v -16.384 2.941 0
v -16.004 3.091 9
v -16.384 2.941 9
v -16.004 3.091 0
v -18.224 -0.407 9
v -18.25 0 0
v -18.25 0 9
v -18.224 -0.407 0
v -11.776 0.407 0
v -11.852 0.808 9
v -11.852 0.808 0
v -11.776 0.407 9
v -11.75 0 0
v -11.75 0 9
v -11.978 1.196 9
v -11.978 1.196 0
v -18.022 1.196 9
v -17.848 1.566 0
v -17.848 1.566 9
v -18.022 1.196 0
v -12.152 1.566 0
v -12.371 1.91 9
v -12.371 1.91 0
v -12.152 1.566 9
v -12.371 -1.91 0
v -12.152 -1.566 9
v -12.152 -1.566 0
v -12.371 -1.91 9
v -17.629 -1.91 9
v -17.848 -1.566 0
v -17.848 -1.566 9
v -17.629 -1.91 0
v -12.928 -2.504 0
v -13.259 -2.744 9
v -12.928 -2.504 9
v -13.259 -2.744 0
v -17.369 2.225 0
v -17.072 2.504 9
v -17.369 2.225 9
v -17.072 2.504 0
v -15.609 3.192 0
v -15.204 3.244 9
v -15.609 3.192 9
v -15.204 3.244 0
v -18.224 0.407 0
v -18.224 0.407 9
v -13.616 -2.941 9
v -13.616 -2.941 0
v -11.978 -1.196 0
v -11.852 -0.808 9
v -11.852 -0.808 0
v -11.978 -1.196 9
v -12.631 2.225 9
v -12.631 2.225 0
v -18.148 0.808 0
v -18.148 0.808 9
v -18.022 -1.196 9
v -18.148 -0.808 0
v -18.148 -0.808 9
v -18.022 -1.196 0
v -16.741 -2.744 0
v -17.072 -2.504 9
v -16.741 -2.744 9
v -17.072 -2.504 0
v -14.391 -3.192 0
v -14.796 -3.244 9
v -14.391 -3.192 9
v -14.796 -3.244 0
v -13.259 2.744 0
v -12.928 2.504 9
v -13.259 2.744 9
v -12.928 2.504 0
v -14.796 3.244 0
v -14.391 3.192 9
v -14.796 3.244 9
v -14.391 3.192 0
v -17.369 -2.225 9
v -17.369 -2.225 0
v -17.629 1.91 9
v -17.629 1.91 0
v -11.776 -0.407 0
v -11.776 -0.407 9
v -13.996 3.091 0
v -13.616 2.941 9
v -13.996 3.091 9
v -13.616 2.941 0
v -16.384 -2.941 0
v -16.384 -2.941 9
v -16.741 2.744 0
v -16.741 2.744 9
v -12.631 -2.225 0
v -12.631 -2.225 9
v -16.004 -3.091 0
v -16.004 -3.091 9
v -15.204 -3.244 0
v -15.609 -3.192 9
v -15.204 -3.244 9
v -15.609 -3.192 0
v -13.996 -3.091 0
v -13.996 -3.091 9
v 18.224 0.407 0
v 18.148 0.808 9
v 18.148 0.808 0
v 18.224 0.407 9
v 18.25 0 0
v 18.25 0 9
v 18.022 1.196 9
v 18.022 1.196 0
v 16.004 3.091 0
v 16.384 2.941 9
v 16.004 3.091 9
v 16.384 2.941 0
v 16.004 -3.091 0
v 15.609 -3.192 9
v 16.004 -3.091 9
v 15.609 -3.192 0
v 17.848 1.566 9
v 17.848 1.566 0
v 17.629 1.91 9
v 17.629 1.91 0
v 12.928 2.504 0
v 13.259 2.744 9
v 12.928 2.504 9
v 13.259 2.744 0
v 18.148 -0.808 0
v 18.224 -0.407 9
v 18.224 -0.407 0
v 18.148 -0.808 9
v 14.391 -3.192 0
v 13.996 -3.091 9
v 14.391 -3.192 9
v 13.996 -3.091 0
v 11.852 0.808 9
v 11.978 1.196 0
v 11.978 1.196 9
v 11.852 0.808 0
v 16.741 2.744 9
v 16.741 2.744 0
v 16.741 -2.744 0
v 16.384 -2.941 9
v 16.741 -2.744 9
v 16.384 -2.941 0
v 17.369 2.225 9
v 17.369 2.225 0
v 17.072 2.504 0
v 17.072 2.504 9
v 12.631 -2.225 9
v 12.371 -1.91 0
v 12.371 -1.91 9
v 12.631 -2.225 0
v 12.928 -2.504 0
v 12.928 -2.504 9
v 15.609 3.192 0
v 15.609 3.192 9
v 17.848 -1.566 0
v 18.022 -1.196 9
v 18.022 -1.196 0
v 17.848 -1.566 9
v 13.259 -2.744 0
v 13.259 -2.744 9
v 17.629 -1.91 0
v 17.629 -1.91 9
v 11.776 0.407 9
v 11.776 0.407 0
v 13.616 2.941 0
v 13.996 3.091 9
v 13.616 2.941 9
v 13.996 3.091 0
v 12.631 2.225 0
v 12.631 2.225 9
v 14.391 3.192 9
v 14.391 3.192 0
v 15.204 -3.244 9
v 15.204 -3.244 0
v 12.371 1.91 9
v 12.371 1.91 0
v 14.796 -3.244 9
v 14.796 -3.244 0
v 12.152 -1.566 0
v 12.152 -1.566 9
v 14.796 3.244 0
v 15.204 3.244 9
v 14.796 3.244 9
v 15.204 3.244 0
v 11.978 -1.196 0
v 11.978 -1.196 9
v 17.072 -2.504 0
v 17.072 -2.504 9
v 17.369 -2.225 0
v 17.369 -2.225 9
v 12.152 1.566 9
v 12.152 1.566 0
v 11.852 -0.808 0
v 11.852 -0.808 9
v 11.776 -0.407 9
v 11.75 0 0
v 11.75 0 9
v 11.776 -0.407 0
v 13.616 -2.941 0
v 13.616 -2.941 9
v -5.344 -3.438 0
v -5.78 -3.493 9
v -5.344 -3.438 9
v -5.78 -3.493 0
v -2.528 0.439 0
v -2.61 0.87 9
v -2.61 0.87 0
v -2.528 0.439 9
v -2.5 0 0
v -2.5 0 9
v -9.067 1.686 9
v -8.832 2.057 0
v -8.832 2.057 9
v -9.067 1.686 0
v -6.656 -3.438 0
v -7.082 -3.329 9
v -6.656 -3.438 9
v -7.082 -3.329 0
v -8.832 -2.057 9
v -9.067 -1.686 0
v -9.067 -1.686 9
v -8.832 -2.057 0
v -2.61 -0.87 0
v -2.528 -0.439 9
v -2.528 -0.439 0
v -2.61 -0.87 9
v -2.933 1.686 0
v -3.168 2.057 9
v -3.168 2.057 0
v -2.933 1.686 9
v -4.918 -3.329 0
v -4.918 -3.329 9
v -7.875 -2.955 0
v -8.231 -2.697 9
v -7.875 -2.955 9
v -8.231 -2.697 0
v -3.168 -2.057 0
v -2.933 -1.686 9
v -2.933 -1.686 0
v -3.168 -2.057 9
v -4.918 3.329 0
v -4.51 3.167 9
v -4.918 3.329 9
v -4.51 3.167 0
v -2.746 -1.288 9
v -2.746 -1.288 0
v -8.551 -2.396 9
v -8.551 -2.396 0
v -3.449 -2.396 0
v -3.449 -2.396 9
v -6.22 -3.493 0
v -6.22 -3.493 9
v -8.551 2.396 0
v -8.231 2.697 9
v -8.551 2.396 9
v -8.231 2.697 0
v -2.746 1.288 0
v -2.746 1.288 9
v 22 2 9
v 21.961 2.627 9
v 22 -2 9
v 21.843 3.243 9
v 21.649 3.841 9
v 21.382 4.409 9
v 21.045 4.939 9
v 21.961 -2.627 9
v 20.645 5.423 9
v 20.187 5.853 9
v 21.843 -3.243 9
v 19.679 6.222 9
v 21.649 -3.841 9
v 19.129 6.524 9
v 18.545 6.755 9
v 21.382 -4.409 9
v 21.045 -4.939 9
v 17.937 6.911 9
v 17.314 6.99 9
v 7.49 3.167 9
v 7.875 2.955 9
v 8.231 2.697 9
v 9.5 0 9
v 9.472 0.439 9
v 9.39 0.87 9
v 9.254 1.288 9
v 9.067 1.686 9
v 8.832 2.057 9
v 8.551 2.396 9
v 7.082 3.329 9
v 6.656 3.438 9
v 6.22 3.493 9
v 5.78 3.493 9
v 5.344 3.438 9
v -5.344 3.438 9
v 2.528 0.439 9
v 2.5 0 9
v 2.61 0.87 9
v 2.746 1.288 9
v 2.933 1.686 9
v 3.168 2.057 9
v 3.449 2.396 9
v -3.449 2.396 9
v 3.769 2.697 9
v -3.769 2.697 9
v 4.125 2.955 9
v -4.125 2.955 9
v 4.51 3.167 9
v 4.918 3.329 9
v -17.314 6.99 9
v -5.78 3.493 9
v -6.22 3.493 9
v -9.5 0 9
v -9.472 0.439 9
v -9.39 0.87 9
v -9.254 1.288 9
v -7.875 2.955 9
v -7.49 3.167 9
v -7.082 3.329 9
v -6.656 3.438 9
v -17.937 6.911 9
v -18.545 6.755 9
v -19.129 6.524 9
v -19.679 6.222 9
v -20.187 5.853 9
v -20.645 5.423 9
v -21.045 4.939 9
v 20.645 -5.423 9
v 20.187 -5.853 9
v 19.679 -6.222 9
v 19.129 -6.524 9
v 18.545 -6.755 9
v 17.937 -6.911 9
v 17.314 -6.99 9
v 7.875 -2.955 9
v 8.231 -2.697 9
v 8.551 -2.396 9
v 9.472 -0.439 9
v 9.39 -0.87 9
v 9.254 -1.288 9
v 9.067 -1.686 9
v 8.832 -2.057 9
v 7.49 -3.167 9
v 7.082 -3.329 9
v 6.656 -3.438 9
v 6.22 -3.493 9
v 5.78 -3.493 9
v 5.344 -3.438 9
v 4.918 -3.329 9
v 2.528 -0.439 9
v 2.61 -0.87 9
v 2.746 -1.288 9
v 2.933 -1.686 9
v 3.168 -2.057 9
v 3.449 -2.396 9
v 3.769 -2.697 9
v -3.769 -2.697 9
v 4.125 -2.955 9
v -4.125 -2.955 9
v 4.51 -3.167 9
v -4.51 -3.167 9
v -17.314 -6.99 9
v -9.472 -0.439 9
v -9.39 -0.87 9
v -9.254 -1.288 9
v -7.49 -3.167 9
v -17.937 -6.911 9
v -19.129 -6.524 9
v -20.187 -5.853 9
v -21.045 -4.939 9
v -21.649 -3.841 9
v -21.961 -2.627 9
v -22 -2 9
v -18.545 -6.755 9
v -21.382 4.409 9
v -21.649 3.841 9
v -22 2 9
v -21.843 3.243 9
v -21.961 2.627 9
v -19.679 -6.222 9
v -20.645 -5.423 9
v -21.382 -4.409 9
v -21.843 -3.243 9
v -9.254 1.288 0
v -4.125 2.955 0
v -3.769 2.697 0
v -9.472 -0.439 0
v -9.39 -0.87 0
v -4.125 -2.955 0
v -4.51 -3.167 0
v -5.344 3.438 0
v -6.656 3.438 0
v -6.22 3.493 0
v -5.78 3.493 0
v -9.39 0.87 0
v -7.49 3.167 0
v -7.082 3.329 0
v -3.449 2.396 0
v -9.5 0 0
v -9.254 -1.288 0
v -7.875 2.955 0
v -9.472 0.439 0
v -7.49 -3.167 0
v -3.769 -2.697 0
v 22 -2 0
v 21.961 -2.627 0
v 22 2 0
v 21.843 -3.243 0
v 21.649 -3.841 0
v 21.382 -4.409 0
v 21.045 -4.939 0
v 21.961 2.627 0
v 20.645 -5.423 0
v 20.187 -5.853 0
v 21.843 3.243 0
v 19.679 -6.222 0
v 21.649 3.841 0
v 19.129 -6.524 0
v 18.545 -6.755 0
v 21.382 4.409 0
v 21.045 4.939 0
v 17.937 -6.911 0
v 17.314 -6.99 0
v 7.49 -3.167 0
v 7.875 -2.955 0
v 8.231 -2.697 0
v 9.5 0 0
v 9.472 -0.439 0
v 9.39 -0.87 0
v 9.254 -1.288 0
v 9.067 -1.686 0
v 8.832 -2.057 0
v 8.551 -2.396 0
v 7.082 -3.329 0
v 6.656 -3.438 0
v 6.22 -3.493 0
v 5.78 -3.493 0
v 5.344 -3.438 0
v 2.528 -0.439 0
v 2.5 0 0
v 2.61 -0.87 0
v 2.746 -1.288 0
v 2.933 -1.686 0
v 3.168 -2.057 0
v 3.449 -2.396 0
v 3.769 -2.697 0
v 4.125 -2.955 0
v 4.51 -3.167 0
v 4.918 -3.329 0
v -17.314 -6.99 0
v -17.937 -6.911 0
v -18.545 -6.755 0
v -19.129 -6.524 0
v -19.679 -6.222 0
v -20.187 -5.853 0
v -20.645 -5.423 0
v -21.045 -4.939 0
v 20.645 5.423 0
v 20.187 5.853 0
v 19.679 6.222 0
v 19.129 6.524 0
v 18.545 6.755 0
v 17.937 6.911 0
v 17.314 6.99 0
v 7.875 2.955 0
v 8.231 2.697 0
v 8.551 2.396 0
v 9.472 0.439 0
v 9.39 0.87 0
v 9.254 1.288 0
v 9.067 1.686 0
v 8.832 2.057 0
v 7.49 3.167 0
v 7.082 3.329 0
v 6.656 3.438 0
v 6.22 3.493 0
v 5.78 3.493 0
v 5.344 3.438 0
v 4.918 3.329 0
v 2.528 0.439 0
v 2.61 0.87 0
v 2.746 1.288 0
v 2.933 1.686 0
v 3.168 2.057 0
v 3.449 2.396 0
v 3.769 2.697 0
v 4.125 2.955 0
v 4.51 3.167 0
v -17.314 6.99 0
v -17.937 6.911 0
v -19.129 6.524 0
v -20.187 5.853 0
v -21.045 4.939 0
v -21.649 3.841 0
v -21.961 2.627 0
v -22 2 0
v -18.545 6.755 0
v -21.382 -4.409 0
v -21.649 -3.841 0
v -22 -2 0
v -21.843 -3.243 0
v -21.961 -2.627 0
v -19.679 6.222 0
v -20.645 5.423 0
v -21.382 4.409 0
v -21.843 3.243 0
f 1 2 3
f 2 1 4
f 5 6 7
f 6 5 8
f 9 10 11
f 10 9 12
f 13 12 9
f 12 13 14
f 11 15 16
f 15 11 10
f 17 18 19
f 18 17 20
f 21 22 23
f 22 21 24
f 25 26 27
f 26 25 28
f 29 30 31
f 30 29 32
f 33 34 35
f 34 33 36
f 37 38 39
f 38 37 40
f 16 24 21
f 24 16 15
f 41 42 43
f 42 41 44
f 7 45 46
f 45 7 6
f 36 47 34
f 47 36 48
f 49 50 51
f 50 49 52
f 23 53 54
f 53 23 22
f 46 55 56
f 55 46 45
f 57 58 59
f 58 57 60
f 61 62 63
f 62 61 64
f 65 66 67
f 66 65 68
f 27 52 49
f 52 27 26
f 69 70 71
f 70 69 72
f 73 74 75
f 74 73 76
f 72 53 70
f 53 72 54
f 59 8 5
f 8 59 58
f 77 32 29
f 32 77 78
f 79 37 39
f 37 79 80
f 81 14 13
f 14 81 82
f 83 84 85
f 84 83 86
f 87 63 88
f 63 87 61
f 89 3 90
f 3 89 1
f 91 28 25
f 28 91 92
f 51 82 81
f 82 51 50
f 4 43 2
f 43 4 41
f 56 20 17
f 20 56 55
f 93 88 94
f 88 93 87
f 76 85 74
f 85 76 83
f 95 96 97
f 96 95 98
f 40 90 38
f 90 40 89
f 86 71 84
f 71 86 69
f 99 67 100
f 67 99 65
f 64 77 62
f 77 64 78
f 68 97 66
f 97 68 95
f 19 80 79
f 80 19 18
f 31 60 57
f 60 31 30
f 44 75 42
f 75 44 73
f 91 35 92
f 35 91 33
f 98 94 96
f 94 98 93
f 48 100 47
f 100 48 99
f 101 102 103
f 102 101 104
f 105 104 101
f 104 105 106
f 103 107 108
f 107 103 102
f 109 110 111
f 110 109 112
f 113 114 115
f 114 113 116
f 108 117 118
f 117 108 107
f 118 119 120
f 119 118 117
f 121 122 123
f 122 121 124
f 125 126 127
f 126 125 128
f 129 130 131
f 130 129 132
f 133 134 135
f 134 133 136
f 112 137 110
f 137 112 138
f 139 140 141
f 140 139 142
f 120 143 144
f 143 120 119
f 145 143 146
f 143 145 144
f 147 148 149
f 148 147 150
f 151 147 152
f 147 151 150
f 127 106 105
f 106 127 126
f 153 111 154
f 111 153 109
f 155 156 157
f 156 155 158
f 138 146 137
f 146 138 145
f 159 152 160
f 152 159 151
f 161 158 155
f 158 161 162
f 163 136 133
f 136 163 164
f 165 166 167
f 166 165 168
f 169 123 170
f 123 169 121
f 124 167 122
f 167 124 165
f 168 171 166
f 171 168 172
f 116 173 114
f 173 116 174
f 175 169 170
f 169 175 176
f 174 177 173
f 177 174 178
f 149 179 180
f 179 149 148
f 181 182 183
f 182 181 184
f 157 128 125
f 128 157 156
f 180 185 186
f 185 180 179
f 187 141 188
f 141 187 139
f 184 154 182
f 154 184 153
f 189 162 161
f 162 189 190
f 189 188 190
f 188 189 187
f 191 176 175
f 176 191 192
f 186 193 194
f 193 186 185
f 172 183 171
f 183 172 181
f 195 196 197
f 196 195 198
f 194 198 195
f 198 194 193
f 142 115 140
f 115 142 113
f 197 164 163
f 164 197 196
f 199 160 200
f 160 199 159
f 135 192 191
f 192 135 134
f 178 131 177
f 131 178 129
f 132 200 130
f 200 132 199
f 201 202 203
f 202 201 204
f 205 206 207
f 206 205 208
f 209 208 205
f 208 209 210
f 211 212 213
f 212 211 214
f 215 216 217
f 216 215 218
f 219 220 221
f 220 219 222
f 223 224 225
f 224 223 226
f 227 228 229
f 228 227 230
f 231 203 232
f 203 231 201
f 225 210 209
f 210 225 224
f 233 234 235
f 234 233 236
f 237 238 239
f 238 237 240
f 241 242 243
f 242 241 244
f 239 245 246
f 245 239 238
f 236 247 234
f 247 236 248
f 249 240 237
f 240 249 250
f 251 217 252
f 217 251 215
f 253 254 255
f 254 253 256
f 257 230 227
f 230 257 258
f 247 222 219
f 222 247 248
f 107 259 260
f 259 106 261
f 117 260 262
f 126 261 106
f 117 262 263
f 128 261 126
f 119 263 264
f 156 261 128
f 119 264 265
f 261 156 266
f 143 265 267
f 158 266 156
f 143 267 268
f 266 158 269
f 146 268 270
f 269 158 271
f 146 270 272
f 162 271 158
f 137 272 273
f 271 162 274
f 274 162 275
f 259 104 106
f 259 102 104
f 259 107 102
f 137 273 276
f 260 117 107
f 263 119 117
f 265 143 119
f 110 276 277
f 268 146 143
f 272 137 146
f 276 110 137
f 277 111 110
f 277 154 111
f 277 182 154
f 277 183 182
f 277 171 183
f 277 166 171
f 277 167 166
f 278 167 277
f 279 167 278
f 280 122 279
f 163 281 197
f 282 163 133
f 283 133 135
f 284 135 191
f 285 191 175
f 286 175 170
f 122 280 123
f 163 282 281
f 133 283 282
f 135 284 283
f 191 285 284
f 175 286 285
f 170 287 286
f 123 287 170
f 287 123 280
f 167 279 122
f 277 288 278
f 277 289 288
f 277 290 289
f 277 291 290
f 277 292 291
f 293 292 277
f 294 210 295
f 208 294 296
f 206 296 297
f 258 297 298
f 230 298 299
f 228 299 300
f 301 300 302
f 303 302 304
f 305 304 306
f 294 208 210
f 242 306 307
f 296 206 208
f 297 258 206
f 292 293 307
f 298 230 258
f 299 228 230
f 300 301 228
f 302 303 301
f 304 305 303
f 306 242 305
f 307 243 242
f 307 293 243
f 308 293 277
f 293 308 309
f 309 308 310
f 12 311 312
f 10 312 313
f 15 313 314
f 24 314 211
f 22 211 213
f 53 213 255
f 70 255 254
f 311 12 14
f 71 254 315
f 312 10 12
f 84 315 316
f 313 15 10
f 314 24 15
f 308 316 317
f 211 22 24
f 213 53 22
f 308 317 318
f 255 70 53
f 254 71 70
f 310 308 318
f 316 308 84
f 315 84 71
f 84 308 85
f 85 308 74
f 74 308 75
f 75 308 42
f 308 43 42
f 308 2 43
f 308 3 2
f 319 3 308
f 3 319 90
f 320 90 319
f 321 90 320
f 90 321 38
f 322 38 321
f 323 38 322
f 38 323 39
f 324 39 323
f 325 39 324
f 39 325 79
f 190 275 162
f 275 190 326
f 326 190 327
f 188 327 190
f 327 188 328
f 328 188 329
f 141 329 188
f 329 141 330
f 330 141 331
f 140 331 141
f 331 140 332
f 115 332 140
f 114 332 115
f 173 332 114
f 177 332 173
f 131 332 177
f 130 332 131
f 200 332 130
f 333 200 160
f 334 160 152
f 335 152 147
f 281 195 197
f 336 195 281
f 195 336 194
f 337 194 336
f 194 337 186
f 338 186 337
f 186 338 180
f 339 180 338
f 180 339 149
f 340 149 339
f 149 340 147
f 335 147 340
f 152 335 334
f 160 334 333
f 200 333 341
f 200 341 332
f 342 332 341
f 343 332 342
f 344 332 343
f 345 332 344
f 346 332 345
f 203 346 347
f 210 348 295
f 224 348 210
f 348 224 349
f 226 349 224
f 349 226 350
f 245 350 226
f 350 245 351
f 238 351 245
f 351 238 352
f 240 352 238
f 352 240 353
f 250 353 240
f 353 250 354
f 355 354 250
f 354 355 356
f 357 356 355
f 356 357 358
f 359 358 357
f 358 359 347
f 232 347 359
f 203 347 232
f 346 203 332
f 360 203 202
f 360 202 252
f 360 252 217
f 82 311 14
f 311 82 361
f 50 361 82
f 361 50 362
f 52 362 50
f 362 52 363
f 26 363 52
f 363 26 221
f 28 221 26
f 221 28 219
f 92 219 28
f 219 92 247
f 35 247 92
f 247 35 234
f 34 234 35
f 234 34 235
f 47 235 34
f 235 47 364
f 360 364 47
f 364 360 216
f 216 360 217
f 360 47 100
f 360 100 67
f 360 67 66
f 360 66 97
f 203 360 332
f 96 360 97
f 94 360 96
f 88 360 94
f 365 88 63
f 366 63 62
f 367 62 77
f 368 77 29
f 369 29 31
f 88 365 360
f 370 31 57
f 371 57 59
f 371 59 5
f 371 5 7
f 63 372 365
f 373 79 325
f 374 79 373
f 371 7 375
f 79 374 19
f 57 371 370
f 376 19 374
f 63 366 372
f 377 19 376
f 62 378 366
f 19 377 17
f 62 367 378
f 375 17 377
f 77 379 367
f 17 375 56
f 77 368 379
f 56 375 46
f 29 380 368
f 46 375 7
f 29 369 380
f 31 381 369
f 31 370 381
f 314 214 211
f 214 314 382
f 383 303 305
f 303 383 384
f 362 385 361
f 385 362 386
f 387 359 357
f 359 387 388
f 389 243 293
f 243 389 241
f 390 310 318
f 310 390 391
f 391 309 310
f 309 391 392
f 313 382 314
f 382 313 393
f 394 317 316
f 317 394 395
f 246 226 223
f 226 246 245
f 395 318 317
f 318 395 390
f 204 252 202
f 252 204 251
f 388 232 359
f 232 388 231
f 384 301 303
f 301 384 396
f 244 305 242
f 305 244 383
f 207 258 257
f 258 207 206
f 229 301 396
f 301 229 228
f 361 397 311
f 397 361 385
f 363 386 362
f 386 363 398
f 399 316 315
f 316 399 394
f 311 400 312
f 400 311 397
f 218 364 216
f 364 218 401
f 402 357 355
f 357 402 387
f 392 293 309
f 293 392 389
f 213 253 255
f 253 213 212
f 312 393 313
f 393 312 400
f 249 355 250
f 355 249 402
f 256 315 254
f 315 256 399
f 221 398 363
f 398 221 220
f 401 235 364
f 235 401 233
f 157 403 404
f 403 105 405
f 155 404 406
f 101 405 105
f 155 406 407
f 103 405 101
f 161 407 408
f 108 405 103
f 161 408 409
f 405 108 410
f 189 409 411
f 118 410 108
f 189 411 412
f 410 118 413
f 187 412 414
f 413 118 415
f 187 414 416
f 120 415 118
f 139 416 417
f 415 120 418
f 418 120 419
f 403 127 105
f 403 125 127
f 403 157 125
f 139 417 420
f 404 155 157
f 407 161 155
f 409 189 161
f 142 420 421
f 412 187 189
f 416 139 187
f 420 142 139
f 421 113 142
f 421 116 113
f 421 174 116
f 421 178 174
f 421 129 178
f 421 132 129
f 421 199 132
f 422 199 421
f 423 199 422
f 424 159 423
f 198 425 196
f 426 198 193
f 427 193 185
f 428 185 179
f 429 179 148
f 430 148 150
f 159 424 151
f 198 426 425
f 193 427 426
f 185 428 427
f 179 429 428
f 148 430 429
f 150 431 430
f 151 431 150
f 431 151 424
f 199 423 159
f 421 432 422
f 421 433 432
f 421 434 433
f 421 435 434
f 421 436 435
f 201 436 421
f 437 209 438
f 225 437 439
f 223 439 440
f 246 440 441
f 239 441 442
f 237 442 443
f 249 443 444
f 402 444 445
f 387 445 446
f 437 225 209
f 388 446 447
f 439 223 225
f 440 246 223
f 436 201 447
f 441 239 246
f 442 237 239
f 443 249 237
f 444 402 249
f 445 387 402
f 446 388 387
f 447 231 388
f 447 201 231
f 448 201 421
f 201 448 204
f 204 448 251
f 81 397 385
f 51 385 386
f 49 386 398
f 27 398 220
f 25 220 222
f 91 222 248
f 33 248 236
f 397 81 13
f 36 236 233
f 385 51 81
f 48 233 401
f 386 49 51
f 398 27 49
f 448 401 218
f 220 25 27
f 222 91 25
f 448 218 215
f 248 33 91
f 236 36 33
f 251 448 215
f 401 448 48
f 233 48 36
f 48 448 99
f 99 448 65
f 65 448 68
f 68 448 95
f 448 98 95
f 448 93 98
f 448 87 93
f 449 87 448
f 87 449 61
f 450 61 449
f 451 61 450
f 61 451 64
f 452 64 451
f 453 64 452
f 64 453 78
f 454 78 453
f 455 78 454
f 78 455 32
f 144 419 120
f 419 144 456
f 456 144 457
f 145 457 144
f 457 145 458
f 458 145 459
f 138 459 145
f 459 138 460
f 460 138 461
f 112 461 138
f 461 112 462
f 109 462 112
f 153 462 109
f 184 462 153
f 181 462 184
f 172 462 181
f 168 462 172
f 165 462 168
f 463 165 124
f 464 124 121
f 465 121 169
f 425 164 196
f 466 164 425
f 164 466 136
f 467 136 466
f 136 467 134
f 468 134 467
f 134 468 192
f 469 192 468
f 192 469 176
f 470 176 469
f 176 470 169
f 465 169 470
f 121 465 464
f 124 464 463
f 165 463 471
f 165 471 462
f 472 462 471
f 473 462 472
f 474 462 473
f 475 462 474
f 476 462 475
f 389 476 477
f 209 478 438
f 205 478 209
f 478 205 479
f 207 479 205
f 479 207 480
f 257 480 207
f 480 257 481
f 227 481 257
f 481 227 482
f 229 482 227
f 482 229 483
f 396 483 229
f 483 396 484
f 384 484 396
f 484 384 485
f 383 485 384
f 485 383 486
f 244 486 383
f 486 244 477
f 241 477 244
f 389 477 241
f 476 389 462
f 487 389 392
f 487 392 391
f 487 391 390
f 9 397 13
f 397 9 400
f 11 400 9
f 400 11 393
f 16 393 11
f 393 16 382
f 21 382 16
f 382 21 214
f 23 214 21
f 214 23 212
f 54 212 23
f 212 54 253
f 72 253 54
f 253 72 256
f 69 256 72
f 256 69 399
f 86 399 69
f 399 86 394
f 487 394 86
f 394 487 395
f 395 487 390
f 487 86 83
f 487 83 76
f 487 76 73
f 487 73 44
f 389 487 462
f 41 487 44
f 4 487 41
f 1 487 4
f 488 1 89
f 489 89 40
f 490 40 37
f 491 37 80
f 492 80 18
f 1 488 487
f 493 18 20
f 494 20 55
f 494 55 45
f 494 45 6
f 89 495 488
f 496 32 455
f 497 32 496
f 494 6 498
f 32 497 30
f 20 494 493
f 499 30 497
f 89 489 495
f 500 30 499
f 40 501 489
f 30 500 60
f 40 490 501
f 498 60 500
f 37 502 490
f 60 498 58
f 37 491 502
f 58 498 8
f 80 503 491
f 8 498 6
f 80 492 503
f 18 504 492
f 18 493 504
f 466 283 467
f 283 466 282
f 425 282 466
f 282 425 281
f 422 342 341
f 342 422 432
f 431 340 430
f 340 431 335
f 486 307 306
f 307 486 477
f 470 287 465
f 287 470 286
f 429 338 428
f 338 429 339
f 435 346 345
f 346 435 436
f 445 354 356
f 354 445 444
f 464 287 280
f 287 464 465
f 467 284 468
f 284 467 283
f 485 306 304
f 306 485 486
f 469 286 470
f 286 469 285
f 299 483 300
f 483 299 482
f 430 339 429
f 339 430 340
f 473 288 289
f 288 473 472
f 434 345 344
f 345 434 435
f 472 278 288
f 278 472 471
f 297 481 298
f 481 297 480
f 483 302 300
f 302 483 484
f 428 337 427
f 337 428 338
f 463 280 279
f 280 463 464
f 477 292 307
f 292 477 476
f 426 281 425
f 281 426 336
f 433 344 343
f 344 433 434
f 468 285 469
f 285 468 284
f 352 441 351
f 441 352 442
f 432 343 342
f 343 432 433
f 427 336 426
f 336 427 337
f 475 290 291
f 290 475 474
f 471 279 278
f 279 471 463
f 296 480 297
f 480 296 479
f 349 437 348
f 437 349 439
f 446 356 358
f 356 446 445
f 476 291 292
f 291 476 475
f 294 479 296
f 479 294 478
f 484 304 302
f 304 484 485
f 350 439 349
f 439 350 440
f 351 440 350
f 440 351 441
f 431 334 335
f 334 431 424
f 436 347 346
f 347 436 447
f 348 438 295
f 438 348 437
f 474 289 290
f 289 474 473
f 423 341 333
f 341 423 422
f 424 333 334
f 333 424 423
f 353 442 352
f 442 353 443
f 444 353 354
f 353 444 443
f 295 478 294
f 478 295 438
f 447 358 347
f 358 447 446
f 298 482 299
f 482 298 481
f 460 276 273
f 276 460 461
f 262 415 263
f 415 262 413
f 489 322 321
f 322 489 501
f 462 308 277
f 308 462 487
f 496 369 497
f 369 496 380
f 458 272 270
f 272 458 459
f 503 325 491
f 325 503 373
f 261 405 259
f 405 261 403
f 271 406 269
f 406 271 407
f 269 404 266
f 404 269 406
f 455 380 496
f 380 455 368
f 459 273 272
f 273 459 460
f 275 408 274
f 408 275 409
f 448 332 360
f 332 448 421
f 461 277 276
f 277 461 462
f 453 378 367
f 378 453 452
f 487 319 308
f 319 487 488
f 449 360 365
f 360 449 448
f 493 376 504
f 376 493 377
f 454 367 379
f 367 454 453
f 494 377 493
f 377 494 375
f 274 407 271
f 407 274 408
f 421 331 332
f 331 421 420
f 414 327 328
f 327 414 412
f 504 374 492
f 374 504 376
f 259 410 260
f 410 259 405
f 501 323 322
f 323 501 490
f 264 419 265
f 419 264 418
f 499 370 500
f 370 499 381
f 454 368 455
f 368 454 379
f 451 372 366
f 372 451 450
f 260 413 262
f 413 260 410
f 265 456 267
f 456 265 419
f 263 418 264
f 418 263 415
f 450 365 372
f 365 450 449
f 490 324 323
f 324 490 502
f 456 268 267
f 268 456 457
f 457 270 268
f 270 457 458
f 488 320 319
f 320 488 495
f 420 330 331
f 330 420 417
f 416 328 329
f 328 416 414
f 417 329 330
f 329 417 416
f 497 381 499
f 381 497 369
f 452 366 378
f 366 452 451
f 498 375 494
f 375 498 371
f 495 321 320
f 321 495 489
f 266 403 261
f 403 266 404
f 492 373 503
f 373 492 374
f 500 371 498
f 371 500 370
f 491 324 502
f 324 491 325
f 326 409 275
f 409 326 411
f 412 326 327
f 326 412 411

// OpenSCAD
$fn = 50;


difference() {
	union() {
		hull() {
			translate(v = [-17.0000000000, 2.0000000000, 0]) {
				cylinder(h = 9, r = 5);
			}
			translate(v = [17.0000000000, 2.0000000000, 0]) {
				cylinder(h = 9, r = 5);
			}
			translate(v = [-17.0000000000, -2.0000000000, 0]) {
				cylinder(h = 9, r = 5);
			}
			translate(v = [17.0000000000, -2.0000000000, 0]) {
				cylinder(h = 9, r = 5);
			}
		}
	}
	union() {
		#translate(v = [-15.0000000000, 0.0000000000, 0]) {
			cylinder(h = 9, r = 3.2500000000);
		}
		#translate(v = [15.0000000000, 0.0000000000, 0]) {
			cylinder(h = 9, r = 3.2500000000);
		}
		#translate(v = [-15.0000000000, 0.0000000000, -100.0000000000]) {
			cylinder(h = 200, r = 3.2500000000);
		}
		#translate(v = [-15.0000000000, 0.0000000000, -100.0000000000]) {
			cylinder(h = 200, r = 3.2500000000);
		}
		#translate(v = [15.0000000000, 0.0000000000, -100.0000000000]) {
			cylinder(h = 200, r = 3.2500000000);
		}
		#translate(v = [15.0000000000, 0.0000000000, -100.0000000000]) {
			cylinder(h = 200, r = 3.2500000000);
		}
		#translate(v = [-15.0000000000, 0.0000000000, 0]) {
			cylinder(h = 9, r = 1.8000000000);
		}
		#translate(v = [15.0000000000, 0.0000000000, 0]) {
			cylinder(h = 9, r = 1.8000000000);
		}
		#translate(v = [-15.0000000000, 0.0000000000, 0]) {
			cylinder(h = 9, r = 1.8000000000);
		}
		#translate(v = [15.0000000000, 0.0000000000, 0]) {
			cylinder(h = 9, r = 1.8000000000);
		}
		#translate(v = [-15.0000000000, 0.0000000000, 0]) {
			cylinder(h = 9, r = 1.8000000000);
		}
		#translate(v = [15.0000000000, 0.0000000000, 0]) {
			cylinder(h = 9, r = 1.8000000000);
		}
		#translate(v = [-6.0000000000, 0, 0]) {
			cylinder(h = 9, r = 3.5000000000);
		}
		#translate(v = [6.0000000000, 0, 0]) {
			cylinder(h = 9, r = 3.5000000000);
		}
	}
}
